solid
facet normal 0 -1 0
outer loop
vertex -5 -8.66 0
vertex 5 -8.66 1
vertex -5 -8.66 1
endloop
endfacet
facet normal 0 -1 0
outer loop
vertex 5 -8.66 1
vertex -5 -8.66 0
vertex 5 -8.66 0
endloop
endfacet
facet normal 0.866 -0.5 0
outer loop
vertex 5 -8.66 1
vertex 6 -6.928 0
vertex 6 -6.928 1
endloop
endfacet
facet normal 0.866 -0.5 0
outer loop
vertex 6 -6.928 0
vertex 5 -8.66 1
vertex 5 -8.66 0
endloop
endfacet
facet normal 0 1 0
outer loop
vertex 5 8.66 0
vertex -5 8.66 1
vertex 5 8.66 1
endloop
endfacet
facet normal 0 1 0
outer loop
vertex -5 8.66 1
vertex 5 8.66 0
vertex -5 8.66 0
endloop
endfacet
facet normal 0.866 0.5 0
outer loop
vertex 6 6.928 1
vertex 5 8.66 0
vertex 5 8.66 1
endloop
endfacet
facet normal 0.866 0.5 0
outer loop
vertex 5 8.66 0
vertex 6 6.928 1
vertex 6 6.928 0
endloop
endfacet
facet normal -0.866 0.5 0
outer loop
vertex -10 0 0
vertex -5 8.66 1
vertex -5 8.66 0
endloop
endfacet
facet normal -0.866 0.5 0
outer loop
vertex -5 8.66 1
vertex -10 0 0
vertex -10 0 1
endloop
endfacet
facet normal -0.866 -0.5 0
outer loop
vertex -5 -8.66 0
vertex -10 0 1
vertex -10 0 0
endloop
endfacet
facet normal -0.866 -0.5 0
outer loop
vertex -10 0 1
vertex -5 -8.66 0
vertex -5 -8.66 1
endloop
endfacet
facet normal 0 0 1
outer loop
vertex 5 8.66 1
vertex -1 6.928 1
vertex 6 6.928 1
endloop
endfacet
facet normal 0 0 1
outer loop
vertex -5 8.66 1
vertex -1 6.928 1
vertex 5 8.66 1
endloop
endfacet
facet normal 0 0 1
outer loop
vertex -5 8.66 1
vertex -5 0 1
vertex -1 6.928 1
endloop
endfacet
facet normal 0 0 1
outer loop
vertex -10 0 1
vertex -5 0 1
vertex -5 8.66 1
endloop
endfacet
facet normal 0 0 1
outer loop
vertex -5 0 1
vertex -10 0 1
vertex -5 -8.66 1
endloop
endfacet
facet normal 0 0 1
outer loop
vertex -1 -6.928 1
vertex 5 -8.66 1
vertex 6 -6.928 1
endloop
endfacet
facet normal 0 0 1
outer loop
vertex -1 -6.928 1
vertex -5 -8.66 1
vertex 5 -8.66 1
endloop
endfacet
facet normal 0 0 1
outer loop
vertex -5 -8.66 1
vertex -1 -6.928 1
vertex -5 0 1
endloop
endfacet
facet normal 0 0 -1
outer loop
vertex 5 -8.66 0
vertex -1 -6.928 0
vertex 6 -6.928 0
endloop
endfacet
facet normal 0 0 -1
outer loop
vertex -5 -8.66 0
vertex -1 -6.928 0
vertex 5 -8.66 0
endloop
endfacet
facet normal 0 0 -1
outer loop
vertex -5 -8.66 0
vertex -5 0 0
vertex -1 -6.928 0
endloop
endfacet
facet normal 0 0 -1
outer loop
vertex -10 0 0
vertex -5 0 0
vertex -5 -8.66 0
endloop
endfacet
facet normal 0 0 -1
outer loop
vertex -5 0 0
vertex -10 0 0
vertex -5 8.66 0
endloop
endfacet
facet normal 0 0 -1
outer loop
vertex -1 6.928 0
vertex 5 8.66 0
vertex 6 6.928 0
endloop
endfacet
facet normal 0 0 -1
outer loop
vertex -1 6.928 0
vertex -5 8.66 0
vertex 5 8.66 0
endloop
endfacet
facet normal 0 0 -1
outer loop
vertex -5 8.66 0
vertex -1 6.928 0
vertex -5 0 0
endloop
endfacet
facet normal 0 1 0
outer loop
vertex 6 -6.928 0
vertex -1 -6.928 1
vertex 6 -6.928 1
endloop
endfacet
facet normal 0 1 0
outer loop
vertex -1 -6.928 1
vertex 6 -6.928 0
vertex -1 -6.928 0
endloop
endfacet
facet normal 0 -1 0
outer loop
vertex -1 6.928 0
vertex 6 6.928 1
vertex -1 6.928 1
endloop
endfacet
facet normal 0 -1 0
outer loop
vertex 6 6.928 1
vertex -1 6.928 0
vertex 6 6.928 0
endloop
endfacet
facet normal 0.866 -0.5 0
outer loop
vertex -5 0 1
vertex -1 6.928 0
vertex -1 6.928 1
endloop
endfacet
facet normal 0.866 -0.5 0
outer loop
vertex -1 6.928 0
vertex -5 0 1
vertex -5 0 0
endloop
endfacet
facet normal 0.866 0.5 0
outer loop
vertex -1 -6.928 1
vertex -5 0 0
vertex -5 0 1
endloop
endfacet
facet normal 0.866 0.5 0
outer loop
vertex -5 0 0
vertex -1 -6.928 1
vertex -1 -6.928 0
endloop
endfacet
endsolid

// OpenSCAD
difference(){
cylinder($fn = 6, r = 10, h = 1);
    translate([3,0,0]){
        cylinder($fn = 6, r = 8, h = 1);
    }
}
